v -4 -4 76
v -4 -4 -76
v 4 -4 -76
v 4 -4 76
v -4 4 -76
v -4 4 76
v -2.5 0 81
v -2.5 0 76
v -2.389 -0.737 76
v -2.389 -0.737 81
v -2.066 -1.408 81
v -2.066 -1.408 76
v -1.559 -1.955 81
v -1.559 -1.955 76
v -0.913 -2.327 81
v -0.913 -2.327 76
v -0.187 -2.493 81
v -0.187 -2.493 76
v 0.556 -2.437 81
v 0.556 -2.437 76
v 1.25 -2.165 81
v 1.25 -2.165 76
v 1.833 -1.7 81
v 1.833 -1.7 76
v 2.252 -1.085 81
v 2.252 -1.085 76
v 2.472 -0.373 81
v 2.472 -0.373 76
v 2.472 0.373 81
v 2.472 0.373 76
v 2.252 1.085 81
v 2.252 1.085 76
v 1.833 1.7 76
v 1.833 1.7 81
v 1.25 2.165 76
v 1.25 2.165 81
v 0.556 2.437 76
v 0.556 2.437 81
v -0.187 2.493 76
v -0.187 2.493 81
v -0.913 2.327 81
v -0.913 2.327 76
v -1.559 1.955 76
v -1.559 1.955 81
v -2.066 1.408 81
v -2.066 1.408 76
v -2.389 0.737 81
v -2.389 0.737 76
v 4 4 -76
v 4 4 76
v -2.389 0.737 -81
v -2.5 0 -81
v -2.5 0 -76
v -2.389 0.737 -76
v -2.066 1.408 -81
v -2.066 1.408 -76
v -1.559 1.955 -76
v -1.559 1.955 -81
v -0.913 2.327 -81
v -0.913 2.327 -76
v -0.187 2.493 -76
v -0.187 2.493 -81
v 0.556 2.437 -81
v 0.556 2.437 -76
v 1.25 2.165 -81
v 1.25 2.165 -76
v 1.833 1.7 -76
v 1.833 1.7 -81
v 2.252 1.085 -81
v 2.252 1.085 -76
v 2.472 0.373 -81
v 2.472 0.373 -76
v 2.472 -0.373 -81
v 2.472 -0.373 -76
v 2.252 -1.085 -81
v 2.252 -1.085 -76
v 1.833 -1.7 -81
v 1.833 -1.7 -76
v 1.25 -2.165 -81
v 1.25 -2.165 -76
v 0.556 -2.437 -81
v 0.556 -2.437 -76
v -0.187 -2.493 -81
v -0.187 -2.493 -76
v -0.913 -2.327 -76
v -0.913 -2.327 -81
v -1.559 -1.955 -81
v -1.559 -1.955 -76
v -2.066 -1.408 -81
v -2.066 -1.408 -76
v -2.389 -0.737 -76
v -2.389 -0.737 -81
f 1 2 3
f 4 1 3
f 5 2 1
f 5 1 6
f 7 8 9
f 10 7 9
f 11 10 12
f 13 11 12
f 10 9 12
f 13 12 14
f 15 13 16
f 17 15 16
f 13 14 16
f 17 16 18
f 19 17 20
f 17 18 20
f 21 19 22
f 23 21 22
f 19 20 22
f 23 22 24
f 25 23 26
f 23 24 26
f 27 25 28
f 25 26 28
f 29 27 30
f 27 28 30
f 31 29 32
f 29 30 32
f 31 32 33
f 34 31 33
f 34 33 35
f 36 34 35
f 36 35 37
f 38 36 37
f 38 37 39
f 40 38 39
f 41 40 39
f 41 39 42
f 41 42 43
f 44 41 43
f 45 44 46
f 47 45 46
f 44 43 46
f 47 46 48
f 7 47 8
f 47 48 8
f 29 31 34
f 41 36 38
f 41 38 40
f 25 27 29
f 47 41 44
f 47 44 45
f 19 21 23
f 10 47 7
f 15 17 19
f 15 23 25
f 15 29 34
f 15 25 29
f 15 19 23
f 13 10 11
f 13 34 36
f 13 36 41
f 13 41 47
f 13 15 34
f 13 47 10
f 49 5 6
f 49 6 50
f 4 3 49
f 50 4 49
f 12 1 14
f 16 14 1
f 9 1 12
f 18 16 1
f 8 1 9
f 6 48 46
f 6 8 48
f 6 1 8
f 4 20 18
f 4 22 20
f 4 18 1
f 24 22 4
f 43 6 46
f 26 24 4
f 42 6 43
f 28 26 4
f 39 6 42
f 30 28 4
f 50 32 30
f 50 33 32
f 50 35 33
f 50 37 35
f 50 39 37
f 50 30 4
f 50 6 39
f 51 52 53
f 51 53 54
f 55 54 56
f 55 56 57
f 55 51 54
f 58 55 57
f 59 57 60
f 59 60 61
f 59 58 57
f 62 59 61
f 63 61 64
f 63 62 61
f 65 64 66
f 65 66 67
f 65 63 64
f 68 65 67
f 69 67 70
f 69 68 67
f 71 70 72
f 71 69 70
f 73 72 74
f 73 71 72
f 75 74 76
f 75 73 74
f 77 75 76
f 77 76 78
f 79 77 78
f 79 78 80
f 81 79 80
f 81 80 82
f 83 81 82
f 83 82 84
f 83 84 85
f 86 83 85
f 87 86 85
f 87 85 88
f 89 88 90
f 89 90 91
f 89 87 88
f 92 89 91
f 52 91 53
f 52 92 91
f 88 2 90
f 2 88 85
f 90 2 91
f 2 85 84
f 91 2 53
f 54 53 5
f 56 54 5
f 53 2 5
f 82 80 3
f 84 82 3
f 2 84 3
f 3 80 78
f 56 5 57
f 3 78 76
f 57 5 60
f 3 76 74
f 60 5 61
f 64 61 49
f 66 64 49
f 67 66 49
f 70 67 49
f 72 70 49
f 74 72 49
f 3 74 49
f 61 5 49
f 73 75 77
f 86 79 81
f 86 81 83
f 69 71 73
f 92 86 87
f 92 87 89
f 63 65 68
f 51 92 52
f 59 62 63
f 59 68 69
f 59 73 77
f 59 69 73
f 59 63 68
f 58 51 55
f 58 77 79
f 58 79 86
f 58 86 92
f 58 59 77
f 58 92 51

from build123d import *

# Parameters (mm, degrees)
CROQUIS1_W              = 8
CROQUIS1_H              = 8
SALIENTE_EXTRUIR1_DEPTH = 76
CROQUIS2_R              = 2.5
SALIENTE_EXTRUIR2_DEPTH = 5
SALIENTE_EXTRUIR3_START = 5
CROQUIS3_R              = 2.5
SALIENTE_EXTRUIR3_DEPTH = 5


with BuildPart() as part:
    # Croquis1 → Saliente-Extruir1 (new, symmetric)
    with BuildSketch(Plane.XY):
        Rectangle(CROQUIS1_W, CROQUIS1_H)
    extrude(amount=SALIENTE_EXTRUIR1_DEPTH, both=True)

    # Croquis2 → Saliente-Extruir2 (add)
    with BuildSketch(Plane.XY.offset(76)):
        with Locations(Location((0, 0, 0), (0, 0, 180))):
            Circle(CROQUIS2_R)
    extrude(amount=SALIENTE_EXTRUIR2_DEPTH)

    # Croquis3 → Saliente-Extruir3 (add)
    with BuildSketch(Plane(origin=(0, 0, -76), x_dir=(-1, 0, 0), z_dir=(0, 0, -1)).offset(SALIENTE_EXTRUIR3_START)):
        Circle(CROQUIS3_R)
    extrude(amount=-SALIENTE_EXTRUIR3_DEPTH)


solid = part.part
